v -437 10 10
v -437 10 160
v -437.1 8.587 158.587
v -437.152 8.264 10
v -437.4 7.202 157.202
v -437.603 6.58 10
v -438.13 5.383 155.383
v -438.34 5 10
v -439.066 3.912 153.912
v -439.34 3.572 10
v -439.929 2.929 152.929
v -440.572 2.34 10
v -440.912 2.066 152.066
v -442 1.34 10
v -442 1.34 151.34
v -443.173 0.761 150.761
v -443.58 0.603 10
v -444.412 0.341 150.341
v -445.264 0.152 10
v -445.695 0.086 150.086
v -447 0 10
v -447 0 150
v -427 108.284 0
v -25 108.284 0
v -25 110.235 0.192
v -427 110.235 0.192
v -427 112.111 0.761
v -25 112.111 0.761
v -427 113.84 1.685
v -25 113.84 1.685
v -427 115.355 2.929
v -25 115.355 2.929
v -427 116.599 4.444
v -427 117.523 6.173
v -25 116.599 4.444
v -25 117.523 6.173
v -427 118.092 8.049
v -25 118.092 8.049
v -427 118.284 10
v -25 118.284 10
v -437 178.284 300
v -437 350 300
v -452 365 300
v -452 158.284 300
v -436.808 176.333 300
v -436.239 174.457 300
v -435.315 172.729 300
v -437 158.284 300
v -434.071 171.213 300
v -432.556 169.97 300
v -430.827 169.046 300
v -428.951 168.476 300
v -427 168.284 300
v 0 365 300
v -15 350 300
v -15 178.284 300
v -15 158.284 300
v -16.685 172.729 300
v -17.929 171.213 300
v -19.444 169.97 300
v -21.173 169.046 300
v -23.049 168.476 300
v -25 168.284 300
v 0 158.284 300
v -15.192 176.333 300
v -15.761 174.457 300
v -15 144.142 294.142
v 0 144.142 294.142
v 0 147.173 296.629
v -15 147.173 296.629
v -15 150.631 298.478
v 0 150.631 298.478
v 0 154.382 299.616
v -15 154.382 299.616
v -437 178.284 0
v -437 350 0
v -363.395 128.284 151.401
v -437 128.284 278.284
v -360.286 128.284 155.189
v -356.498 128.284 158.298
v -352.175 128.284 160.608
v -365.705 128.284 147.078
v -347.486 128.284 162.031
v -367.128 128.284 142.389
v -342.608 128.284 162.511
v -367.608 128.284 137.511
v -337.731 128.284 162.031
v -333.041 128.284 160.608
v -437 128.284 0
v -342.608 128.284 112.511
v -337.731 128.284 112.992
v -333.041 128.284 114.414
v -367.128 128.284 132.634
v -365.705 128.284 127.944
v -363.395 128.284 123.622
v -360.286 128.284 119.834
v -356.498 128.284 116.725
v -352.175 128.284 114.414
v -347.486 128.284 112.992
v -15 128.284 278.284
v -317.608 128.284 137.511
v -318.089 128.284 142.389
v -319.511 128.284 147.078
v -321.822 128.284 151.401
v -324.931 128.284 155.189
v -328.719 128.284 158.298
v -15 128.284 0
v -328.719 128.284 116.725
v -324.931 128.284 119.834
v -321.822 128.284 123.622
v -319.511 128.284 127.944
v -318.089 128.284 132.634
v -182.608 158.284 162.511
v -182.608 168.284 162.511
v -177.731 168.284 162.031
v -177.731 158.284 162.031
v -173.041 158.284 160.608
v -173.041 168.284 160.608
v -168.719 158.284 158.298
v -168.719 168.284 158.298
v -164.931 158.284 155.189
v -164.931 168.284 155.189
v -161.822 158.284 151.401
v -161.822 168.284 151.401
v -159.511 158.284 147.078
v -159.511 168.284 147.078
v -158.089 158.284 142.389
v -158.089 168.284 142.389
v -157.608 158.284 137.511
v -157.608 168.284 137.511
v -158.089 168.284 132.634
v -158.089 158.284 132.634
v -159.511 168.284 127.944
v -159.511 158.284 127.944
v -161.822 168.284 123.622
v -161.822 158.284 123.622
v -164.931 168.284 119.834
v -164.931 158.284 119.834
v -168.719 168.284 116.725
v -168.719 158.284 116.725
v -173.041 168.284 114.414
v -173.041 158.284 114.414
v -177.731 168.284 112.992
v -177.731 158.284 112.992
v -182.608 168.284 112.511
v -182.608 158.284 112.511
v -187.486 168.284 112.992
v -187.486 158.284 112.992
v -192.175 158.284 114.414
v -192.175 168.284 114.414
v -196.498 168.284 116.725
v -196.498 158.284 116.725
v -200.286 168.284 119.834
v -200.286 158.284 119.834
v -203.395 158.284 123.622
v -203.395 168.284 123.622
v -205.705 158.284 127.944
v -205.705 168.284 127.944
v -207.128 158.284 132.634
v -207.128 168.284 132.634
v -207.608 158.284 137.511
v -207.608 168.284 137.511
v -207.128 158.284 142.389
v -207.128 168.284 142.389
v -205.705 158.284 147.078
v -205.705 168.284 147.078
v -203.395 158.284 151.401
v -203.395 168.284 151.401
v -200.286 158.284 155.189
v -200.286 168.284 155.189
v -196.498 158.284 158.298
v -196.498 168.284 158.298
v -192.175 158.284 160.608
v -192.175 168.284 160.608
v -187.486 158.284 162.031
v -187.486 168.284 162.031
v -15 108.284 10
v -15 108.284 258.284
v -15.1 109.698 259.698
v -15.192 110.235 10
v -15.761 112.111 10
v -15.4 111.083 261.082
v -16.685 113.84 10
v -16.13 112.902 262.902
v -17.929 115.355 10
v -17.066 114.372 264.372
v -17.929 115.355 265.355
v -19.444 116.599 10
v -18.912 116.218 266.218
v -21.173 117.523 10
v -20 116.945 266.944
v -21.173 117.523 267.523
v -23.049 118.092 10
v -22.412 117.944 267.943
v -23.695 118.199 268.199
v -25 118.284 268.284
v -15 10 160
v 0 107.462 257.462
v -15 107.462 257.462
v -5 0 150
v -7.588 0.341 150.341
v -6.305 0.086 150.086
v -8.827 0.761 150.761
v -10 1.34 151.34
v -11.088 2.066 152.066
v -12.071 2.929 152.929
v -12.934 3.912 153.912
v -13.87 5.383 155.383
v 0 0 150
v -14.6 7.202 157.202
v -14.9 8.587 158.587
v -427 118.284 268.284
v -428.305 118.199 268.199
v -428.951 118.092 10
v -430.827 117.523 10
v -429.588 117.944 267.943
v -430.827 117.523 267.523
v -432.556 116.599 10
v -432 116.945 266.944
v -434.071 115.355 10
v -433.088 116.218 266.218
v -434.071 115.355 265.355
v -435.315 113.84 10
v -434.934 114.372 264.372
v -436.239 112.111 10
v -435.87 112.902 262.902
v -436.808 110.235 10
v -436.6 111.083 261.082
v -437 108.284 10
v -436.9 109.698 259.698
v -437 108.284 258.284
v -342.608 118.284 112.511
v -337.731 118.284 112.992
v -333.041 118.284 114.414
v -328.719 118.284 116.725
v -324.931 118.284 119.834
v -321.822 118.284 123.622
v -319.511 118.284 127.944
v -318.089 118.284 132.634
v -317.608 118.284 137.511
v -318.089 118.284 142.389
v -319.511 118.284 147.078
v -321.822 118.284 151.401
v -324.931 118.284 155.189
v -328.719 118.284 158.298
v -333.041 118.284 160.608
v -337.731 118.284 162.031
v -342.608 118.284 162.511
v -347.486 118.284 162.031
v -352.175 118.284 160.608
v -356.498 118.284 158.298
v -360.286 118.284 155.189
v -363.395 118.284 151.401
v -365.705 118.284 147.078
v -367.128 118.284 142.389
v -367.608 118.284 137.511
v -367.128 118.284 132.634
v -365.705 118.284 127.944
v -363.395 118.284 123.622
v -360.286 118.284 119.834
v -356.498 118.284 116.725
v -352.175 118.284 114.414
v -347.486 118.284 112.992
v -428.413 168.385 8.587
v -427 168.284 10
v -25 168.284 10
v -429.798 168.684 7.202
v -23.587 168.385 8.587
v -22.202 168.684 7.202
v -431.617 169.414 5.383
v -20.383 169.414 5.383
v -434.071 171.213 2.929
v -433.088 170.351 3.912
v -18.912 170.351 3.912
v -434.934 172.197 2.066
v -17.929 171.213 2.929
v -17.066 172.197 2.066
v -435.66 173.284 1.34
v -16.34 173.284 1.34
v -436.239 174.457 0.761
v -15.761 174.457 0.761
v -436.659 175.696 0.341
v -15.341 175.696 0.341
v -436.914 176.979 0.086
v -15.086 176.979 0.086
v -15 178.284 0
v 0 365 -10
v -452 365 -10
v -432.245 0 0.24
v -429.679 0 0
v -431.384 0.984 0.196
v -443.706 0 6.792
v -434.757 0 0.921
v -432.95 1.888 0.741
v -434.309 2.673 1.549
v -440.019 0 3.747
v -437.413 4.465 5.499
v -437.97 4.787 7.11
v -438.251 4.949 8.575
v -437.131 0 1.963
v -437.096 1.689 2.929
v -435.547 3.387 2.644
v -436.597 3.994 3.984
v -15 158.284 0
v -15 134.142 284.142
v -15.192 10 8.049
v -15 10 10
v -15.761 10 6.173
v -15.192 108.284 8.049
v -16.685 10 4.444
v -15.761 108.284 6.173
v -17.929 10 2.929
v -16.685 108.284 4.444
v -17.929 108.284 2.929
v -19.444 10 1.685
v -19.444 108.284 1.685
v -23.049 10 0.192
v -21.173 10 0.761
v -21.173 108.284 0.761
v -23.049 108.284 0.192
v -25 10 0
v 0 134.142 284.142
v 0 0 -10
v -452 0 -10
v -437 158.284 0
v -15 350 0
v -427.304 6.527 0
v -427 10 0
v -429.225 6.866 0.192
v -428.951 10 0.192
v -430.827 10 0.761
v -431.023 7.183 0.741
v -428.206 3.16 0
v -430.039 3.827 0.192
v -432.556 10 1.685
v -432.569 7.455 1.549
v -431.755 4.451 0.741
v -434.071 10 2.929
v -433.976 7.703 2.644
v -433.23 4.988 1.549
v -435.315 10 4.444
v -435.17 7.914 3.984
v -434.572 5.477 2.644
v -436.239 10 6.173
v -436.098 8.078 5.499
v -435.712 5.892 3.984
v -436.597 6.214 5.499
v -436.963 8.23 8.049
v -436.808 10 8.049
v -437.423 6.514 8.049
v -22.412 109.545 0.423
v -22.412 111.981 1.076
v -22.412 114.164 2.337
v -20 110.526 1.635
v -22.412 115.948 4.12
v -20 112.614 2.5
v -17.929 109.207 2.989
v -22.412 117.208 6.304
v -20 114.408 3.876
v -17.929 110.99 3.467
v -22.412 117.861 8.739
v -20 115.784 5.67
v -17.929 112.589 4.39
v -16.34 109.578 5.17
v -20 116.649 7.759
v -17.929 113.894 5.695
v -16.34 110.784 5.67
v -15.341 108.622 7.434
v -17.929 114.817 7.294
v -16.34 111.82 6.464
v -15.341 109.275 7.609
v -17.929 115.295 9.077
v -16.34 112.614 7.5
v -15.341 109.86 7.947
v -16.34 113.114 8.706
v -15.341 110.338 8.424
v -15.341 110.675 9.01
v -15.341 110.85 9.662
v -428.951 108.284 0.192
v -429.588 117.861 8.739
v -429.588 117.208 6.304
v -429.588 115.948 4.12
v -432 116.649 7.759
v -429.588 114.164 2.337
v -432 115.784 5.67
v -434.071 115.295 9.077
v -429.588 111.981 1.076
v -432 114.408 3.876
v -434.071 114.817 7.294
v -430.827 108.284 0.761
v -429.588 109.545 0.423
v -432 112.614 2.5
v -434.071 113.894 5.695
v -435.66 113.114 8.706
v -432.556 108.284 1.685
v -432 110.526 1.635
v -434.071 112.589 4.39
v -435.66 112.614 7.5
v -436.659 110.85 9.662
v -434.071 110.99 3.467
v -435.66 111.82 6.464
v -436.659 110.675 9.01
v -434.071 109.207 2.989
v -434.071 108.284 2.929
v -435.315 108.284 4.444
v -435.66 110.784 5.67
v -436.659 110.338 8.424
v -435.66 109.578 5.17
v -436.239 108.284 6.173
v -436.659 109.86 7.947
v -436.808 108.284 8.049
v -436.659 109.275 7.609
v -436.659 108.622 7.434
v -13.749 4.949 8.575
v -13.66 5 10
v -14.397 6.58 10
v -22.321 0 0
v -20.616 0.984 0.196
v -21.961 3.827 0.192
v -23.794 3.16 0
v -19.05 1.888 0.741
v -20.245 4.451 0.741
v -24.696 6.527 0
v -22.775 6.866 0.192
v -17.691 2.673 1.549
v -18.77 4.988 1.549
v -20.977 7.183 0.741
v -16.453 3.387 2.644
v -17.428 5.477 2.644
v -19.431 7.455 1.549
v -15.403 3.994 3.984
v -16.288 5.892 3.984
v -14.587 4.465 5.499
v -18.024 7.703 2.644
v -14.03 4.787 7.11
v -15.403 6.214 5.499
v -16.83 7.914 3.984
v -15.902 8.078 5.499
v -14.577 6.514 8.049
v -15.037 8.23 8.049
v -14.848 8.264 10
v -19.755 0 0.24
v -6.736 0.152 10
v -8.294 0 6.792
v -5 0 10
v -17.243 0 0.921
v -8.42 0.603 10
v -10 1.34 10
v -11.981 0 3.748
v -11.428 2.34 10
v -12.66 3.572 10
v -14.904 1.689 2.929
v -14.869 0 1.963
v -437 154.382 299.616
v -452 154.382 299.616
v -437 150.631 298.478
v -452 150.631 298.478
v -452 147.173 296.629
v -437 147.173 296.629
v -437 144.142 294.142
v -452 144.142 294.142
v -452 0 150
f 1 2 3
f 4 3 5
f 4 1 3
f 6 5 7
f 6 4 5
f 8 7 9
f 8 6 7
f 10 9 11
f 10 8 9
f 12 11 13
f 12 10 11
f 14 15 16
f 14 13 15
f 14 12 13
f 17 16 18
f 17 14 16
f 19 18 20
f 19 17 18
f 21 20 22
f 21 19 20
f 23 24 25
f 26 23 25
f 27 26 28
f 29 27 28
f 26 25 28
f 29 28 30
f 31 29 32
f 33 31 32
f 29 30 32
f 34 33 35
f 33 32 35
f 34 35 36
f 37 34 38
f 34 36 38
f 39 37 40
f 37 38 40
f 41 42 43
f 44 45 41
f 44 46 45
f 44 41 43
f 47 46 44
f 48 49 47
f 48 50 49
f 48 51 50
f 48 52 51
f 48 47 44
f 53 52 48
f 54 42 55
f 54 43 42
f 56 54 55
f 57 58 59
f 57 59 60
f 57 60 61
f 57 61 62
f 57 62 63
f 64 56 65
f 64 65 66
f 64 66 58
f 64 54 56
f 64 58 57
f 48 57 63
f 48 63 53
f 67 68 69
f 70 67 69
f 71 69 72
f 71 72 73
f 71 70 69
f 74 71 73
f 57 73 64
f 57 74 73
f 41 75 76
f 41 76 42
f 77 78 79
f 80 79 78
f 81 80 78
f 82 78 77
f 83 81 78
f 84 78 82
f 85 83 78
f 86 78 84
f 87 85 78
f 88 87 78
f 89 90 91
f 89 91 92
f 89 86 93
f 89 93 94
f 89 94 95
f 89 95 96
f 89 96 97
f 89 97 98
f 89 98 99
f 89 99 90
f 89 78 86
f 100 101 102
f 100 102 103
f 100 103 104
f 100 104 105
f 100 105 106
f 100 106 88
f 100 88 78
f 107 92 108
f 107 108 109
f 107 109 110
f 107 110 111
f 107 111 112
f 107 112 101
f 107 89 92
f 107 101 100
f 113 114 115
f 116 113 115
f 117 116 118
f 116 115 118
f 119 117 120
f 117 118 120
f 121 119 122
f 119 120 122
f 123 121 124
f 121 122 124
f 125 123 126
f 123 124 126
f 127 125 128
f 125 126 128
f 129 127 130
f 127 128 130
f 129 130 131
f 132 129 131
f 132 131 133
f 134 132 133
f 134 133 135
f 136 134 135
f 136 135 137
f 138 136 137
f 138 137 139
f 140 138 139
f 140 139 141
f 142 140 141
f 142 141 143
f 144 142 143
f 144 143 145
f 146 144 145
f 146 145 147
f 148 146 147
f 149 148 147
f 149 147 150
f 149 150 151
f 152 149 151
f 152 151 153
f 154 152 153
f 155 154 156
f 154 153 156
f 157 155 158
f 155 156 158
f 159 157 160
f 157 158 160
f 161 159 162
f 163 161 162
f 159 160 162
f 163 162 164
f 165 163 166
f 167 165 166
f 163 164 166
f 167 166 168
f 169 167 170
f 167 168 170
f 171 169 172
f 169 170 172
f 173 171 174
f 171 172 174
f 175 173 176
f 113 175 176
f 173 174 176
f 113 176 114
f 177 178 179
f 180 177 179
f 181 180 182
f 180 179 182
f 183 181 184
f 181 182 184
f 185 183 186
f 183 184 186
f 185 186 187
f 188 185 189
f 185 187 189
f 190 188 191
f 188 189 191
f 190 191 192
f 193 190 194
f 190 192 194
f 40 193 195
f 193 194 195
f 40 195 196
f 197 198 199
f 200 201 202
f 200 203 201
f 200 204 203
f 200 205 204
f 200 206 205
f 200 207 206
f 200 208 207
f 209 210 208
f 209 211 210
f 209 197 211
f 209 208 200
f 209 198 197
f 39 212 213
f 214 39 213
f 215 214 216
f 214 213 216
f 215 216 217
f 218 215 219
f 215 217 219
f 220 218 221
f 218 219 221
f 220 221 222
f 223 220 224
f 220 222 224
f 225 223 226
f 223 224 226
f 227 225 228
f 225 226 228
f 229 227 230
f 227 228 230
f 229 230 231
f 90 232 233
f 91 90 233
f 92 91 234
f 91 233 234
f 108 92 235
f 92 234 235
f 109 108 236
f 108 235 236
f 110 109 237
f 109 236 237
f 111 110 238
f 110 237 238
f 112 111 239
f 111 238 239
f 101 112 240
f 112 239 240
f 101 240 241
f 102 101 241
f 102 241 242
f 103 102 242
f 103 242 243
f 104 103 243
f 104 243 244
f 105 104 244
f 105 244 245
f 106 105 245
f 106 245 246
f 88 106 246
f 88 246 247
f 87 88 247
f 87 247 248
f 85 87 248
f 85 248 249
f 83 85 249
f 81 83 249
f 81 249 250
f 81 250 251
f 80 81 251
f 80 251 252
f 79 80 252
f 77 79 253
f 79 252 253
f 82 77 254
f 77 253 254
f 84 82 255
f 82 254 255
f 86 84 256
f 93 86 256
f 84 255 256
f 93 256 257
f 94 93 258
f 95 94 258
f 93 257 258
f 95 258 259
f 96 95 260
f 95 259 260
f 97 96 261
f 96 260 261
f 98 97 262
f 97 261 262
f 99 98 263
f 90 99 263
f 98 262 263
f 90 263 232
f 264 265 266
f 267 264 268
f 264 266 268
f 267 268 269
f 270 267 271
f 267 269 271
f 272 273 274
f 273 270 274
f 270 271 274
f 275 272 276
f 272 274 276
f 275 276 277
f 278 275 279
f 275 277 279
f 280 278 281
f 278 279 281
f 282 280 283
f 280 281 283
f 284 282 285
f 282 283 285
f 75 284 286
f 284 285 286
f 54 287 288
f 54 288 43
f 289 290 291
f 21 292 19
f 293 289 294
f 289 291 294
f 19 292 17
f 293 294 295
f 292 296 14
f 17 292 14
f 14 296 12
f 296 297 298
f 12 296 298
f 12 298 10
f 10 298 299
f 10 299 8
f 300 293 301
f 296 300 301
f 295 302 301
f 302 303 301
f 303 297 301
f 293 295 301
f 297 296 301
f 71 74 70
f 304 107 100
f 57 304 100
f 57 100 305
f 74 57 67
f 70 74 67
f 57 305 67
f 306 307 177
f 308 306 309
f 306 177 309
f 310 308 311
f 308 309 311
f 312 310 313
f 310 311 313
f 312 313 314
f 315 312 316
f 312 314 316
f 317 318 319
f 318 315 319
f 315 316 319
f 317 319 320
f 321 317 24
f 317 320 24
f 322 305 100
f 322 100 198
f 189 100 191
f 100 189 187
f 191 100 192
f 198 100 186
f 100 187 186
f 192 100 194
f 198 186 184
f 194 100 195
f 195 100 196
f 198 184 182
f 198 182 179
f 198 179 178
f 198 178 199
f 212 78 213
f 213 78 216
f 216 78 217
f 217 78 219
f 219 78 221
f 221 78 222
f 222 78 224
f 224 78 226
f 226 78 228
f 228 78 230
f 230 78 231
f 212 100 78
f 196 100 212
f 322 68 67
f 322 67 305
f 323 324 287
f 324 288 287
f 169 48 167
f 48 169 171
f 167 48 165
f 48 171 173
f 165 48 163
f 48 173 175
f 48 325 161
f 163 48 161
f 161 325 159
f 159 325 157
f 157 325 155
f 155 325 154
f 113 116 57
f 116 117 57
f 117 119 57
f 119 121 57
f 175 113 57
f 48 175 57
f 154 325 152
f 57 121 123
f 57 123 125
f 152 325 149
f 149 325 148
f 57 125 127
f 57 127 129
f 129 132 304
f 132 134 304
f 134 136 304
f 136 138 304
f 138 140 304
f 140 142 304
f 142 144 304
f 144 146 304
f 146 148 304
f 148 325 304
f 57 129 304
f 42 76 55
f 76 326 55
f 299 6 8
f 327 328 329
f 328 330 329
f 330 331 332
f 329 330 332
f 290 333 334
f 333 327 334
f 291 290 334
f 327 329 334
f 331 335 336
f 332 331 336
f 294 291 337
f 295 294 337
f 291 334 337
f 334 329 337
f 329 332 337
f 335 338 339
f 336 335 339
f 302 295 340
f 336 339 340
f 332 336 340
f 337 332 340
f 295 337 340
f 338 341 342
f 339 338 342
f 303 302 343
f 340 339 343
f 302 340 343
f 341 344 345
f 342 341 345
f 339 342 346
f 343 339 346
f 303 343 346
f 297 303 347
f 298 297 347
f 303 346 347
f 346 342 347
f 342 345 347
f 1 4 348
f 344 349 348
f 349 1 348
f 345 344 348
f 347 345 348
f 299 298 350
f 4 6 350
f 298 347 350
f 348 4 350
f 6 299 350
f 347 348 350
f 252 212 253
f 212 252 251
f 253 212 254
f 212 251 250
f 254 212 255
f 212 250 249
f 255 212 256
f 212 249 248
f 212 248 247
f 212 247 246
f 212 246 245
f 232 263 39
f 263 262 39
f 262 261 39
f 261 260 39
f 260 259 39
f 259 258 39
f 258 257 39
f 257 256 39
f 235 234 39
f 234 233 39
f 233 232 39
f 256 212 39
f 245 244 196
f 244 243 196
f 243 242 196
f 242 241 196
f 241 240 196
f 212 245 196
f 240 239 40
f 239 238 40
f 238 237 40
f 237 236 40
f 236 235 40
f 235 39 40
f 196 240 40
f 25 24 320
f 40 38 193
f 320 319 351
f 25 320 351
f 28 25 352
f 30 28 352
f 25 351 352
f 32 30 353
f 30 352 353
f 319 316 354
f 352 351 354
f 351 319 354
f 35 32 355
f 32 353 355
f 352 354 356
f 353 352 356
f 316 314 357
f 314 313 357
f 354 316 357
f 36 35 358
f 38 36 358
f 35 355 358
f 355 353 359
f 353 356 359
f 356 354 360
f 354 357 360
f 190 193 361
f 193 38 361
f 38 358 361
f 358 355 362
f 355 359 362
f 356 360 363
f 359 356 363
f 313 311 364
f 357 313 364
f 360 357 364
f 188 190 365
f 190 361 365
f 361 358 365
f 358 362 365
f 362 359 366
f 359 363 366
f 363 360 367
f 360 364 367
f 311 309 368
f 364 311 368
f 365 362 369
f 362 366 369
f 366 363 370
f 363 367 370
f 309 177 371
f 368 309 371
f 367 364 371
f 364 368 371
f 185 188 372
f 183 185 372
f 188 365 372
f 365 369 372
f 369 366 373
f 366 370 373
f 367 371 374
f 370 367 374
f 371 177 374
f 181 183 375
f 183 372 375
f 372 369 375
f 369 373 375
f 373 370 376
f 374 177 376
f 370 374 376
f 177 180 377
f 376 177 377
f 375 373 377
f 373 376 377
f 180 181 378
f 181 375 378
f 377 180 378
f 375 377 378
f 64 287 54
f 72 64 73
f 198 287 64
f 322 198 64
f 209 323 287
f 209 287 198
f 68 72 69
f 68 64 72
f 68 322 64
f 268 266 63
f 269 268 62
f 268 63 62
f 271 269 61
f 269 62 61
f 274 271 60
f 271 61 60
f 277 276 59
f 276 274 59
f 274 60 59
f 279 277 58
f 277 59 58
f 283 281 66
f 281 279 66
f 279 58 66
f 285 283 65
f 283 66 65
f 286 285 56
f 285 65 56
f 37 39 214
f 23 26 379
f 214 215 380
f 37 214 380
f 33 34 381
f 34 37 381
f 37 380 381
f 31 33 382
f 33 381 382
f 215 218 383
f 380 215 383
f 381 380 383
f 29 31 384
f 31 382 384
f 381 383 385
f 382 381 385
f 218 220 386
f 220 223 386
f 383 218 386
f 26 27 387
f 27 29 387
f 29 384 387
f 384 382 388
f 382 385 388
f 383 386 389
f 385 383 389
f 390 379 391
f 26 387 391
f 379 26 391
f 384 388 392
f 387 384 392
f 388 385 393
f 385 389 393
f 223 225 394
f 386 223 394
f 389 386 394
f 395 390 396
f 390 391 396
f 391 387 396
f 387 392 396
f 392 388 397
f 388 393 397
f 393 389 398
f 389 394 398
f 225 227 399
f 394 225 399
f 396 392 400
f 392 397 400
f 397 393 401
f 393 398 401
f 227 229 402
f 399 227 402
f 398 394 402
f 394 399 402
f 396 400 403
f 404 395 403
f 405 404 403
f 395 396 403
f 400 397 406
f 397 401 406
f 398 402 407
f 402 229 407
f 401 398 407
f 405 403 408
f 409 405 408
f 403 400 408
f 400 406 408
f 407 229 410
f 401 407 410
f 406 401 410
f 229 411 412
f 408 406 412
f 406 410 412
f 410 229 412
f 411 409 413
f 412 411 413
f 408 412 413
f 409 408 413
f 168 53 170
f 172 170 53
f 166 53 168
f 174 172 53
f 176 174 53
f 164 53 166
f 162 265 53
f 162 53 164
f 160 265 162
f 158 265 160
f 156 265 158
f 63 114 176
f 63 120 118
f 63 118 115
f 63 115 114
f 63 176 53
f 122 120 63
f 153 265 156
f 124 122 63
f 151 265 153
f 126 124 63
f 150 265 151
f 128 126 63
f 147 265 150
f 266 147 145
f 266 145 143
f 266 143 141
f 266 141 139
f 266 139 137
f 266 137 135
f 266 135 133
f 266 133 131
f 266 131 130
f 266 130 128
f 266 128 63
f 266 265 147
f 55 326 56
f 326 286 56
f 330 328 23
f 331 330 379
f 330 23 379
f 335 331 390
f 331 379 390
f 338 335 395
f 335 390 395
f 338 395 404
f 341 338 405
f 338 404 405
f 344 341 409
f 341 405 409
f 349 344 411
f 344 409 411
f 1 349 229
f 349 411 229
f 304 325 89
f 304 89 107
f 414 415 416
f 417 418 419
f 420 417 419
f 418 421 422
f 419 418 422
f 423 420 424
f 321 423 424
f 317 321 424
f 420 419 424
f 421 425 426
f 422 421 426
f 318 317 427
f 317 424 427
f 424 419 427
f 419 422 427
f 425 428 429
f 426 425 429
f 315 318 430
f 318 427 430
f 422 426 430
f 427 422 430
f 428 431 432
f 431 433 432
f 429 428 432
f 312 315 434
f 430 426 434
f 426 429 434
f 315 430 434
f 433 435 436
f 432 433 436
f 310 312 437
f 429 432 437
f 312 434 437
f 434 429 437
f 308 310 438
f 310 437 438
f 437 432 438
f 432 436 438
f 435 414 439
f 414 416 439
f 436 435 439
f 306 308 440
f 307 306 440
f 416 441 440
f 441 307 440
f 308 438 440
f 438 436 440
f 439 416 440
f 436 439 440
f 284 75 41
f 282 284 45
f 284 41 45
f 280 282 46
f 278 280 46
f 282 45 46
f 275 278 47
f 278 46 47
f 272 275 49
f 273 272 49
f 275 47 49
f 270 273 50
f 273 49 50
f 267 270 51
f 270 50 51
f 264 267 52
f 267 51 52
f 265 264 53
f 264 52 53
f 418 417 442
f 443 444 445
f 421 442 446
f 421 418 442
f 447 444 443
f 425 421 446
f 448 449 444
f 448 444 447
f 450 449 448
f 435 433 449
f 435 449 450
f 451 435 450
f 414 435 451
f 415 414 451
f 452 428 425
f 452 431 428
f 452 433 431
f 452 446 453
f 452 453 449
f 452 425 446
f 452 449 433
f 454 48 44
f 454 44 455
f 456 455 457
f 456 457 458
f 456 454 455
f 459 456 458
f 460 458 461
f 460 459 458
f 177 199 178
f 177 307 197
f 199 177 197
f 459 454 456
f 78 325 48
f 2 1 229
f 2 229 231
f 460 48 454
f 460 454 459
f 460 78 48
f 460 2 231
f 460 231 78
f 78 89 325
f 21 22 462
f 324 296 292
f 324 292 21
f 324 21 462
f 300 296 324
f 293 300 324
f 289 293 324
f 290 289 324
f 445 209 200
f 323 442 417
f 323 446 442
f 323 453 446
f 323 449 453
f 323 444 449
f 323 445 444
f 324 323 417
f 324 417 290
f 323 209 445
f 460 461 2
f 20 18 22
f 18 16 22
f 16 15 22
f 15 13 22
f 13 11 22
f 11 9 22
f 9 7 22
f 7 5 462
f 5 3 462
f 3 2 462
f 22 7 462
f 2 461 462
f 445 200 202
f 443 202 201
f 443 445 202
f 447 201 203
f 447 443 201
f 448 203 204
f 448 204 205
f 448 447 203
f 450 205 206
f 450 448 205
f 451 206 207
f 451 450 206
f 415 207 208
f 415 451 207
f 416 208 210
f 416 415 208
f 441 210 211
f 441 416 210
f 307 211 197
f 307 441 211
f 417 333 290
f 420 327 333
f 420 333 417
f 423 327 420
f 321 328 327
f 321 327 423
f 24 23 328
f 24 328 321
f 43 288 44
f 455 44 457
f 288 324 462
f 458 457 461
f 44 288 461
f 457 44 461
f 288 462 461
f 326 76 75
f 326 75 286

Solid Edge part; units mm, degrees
sketch "Sketch1" plane through (0, 0, 0) normal (1, 0, 0) x (0, 1, 0)
  line L0 (150, 300) -> (0, 150)
  line L1 (0, 150) -> (0, 0)
  line L2 (0, 0) -> (350, 0)
  line L3 (350, 0) -> (350, 300)
  line L4 (350, 300) -> (150, 300)
extrude "Protrusion1" add sketch "Sketch1" against normal blind 15
sketch "Sketch2" plane through (-10, 350, 150) normal (0, 1, 0) x (0, 0, -1)
  line L0 (-150, 442) -> (-150, -10)
  line L1 (-150, -10) -> (150, -10)
  line L2 (150, -10) -> (150, 442)
  line L3 (150, 442) -> (-150, 442)
extrude "ProtrusiónExtruida_3" add sketch "Sketch2" along normal blind 15
sketch "Sketch3" plane through (-452, 360, 150) normal (-1, 0, 0) x (0, 0, 1)
  line L0 (150, -210) -> (0, -360)
  line L1 (0, -360) -> (-150, -360)
  line L2 (-150, -360) -> (-150, -10)
  line L3 (-150, -10) -> (150, -10)
  line L4 (150, -10) -> (150, -210)
extrude "ProtrusiónExtruida_5" add sketch "Sketch3" against normal blind 15
sketch "Sketch4" plane through (-226, 185, 0) normal (0, 0, -1) x (1, 0, 0)
  line L0 (-226, 185) -> (226, 185)
  line L1 (226, 185) -> (226, -180)
  line L2 (226, -180) -> (-226, -180)
  line L3 (-226, -180) -> (-226, 185)
extrude "ProtrusiónExtruida_6" add sketch "Sketch4" along normal blind 10
fillet "Redondeo_5" radius 20 2 edges at (-7.5, 150, 300) (-444.5, 150, 300)
sketch "Sketch5" plane through (-226, 175, 0) normal (0, 0, 1) x (1, 0, 0)
  line L0 (-211, -6.7157) -> (211, -6.7157)
  line L1 (211, -6.7157) -> (211, -16.7157)
  line L2 (-211, -16.7157) -> (211, -16.7157)
  line L3 (-211, -16.7157) -> (-211, -6.7157)
  line L4 (-211, -56.7157) -> (211, -56.7157)
  line L5 (211, -46.7157) -> (211, -56.7157)
  line L6 (-211, -46.7157) -> (211, -46.7157)
  line L7 (-211, -56.7157) -> (-211, -46.7157)
  dimension "D1" = 10
  dimension "D2" = 15
extrude "ProtrusiónExtruida_12" add sketch "Sketch5" along normal blind 300
fillet "Redondeo_13" radius 10 6 edges at (-226, 118.2843, 0) (-226, 168.2843, 0) (-437, 0, 75) (-15, 0, 75) (-437, 168.2843, 150) (-15, 168.2843, 150)
sketch "Sketch6" plane through (-437, 123.2843, 284.1421) normal (-1, 0, 0) x (0, -1, 0)
  line L0 (15.8227, 25.3838) -> (15.8227, -26.6806)
  line L1 (-10.8579, 25.3838) -> (15.8227, 25.3838)
  line L2 (-10.8579, 0) -> (-10.8579, 25.3838)
  line L3 (-10.8579, 0) -> (15.8227, -26.6806)
extrude "VaciadoExtruido_1" cut sketch "Sketch6" against normal blind 516.6501
fillet "Round1" radius 10 8 edges at (-437, 118.2843, 139.1421) (-437, 115.3553, 2.9289) (-437, 59.1421, 0) (-439.9289, 2.9289, 0) (-15, 118.2843, 139.1421) (-15, 115.3553, 2.9289) (-15, 59.1421, 0) (-12.0711, 2.9289, 0)
hole "Agujero_3" at (-342.6083, 118.2843, 137.5113) direction (0, 1, 0) diameter 50 end up to next
hole "Agujero_4" at (-182.6083, 168.2843, 137.5113) direction (0, -1, 0) diameter 50 end up to next
